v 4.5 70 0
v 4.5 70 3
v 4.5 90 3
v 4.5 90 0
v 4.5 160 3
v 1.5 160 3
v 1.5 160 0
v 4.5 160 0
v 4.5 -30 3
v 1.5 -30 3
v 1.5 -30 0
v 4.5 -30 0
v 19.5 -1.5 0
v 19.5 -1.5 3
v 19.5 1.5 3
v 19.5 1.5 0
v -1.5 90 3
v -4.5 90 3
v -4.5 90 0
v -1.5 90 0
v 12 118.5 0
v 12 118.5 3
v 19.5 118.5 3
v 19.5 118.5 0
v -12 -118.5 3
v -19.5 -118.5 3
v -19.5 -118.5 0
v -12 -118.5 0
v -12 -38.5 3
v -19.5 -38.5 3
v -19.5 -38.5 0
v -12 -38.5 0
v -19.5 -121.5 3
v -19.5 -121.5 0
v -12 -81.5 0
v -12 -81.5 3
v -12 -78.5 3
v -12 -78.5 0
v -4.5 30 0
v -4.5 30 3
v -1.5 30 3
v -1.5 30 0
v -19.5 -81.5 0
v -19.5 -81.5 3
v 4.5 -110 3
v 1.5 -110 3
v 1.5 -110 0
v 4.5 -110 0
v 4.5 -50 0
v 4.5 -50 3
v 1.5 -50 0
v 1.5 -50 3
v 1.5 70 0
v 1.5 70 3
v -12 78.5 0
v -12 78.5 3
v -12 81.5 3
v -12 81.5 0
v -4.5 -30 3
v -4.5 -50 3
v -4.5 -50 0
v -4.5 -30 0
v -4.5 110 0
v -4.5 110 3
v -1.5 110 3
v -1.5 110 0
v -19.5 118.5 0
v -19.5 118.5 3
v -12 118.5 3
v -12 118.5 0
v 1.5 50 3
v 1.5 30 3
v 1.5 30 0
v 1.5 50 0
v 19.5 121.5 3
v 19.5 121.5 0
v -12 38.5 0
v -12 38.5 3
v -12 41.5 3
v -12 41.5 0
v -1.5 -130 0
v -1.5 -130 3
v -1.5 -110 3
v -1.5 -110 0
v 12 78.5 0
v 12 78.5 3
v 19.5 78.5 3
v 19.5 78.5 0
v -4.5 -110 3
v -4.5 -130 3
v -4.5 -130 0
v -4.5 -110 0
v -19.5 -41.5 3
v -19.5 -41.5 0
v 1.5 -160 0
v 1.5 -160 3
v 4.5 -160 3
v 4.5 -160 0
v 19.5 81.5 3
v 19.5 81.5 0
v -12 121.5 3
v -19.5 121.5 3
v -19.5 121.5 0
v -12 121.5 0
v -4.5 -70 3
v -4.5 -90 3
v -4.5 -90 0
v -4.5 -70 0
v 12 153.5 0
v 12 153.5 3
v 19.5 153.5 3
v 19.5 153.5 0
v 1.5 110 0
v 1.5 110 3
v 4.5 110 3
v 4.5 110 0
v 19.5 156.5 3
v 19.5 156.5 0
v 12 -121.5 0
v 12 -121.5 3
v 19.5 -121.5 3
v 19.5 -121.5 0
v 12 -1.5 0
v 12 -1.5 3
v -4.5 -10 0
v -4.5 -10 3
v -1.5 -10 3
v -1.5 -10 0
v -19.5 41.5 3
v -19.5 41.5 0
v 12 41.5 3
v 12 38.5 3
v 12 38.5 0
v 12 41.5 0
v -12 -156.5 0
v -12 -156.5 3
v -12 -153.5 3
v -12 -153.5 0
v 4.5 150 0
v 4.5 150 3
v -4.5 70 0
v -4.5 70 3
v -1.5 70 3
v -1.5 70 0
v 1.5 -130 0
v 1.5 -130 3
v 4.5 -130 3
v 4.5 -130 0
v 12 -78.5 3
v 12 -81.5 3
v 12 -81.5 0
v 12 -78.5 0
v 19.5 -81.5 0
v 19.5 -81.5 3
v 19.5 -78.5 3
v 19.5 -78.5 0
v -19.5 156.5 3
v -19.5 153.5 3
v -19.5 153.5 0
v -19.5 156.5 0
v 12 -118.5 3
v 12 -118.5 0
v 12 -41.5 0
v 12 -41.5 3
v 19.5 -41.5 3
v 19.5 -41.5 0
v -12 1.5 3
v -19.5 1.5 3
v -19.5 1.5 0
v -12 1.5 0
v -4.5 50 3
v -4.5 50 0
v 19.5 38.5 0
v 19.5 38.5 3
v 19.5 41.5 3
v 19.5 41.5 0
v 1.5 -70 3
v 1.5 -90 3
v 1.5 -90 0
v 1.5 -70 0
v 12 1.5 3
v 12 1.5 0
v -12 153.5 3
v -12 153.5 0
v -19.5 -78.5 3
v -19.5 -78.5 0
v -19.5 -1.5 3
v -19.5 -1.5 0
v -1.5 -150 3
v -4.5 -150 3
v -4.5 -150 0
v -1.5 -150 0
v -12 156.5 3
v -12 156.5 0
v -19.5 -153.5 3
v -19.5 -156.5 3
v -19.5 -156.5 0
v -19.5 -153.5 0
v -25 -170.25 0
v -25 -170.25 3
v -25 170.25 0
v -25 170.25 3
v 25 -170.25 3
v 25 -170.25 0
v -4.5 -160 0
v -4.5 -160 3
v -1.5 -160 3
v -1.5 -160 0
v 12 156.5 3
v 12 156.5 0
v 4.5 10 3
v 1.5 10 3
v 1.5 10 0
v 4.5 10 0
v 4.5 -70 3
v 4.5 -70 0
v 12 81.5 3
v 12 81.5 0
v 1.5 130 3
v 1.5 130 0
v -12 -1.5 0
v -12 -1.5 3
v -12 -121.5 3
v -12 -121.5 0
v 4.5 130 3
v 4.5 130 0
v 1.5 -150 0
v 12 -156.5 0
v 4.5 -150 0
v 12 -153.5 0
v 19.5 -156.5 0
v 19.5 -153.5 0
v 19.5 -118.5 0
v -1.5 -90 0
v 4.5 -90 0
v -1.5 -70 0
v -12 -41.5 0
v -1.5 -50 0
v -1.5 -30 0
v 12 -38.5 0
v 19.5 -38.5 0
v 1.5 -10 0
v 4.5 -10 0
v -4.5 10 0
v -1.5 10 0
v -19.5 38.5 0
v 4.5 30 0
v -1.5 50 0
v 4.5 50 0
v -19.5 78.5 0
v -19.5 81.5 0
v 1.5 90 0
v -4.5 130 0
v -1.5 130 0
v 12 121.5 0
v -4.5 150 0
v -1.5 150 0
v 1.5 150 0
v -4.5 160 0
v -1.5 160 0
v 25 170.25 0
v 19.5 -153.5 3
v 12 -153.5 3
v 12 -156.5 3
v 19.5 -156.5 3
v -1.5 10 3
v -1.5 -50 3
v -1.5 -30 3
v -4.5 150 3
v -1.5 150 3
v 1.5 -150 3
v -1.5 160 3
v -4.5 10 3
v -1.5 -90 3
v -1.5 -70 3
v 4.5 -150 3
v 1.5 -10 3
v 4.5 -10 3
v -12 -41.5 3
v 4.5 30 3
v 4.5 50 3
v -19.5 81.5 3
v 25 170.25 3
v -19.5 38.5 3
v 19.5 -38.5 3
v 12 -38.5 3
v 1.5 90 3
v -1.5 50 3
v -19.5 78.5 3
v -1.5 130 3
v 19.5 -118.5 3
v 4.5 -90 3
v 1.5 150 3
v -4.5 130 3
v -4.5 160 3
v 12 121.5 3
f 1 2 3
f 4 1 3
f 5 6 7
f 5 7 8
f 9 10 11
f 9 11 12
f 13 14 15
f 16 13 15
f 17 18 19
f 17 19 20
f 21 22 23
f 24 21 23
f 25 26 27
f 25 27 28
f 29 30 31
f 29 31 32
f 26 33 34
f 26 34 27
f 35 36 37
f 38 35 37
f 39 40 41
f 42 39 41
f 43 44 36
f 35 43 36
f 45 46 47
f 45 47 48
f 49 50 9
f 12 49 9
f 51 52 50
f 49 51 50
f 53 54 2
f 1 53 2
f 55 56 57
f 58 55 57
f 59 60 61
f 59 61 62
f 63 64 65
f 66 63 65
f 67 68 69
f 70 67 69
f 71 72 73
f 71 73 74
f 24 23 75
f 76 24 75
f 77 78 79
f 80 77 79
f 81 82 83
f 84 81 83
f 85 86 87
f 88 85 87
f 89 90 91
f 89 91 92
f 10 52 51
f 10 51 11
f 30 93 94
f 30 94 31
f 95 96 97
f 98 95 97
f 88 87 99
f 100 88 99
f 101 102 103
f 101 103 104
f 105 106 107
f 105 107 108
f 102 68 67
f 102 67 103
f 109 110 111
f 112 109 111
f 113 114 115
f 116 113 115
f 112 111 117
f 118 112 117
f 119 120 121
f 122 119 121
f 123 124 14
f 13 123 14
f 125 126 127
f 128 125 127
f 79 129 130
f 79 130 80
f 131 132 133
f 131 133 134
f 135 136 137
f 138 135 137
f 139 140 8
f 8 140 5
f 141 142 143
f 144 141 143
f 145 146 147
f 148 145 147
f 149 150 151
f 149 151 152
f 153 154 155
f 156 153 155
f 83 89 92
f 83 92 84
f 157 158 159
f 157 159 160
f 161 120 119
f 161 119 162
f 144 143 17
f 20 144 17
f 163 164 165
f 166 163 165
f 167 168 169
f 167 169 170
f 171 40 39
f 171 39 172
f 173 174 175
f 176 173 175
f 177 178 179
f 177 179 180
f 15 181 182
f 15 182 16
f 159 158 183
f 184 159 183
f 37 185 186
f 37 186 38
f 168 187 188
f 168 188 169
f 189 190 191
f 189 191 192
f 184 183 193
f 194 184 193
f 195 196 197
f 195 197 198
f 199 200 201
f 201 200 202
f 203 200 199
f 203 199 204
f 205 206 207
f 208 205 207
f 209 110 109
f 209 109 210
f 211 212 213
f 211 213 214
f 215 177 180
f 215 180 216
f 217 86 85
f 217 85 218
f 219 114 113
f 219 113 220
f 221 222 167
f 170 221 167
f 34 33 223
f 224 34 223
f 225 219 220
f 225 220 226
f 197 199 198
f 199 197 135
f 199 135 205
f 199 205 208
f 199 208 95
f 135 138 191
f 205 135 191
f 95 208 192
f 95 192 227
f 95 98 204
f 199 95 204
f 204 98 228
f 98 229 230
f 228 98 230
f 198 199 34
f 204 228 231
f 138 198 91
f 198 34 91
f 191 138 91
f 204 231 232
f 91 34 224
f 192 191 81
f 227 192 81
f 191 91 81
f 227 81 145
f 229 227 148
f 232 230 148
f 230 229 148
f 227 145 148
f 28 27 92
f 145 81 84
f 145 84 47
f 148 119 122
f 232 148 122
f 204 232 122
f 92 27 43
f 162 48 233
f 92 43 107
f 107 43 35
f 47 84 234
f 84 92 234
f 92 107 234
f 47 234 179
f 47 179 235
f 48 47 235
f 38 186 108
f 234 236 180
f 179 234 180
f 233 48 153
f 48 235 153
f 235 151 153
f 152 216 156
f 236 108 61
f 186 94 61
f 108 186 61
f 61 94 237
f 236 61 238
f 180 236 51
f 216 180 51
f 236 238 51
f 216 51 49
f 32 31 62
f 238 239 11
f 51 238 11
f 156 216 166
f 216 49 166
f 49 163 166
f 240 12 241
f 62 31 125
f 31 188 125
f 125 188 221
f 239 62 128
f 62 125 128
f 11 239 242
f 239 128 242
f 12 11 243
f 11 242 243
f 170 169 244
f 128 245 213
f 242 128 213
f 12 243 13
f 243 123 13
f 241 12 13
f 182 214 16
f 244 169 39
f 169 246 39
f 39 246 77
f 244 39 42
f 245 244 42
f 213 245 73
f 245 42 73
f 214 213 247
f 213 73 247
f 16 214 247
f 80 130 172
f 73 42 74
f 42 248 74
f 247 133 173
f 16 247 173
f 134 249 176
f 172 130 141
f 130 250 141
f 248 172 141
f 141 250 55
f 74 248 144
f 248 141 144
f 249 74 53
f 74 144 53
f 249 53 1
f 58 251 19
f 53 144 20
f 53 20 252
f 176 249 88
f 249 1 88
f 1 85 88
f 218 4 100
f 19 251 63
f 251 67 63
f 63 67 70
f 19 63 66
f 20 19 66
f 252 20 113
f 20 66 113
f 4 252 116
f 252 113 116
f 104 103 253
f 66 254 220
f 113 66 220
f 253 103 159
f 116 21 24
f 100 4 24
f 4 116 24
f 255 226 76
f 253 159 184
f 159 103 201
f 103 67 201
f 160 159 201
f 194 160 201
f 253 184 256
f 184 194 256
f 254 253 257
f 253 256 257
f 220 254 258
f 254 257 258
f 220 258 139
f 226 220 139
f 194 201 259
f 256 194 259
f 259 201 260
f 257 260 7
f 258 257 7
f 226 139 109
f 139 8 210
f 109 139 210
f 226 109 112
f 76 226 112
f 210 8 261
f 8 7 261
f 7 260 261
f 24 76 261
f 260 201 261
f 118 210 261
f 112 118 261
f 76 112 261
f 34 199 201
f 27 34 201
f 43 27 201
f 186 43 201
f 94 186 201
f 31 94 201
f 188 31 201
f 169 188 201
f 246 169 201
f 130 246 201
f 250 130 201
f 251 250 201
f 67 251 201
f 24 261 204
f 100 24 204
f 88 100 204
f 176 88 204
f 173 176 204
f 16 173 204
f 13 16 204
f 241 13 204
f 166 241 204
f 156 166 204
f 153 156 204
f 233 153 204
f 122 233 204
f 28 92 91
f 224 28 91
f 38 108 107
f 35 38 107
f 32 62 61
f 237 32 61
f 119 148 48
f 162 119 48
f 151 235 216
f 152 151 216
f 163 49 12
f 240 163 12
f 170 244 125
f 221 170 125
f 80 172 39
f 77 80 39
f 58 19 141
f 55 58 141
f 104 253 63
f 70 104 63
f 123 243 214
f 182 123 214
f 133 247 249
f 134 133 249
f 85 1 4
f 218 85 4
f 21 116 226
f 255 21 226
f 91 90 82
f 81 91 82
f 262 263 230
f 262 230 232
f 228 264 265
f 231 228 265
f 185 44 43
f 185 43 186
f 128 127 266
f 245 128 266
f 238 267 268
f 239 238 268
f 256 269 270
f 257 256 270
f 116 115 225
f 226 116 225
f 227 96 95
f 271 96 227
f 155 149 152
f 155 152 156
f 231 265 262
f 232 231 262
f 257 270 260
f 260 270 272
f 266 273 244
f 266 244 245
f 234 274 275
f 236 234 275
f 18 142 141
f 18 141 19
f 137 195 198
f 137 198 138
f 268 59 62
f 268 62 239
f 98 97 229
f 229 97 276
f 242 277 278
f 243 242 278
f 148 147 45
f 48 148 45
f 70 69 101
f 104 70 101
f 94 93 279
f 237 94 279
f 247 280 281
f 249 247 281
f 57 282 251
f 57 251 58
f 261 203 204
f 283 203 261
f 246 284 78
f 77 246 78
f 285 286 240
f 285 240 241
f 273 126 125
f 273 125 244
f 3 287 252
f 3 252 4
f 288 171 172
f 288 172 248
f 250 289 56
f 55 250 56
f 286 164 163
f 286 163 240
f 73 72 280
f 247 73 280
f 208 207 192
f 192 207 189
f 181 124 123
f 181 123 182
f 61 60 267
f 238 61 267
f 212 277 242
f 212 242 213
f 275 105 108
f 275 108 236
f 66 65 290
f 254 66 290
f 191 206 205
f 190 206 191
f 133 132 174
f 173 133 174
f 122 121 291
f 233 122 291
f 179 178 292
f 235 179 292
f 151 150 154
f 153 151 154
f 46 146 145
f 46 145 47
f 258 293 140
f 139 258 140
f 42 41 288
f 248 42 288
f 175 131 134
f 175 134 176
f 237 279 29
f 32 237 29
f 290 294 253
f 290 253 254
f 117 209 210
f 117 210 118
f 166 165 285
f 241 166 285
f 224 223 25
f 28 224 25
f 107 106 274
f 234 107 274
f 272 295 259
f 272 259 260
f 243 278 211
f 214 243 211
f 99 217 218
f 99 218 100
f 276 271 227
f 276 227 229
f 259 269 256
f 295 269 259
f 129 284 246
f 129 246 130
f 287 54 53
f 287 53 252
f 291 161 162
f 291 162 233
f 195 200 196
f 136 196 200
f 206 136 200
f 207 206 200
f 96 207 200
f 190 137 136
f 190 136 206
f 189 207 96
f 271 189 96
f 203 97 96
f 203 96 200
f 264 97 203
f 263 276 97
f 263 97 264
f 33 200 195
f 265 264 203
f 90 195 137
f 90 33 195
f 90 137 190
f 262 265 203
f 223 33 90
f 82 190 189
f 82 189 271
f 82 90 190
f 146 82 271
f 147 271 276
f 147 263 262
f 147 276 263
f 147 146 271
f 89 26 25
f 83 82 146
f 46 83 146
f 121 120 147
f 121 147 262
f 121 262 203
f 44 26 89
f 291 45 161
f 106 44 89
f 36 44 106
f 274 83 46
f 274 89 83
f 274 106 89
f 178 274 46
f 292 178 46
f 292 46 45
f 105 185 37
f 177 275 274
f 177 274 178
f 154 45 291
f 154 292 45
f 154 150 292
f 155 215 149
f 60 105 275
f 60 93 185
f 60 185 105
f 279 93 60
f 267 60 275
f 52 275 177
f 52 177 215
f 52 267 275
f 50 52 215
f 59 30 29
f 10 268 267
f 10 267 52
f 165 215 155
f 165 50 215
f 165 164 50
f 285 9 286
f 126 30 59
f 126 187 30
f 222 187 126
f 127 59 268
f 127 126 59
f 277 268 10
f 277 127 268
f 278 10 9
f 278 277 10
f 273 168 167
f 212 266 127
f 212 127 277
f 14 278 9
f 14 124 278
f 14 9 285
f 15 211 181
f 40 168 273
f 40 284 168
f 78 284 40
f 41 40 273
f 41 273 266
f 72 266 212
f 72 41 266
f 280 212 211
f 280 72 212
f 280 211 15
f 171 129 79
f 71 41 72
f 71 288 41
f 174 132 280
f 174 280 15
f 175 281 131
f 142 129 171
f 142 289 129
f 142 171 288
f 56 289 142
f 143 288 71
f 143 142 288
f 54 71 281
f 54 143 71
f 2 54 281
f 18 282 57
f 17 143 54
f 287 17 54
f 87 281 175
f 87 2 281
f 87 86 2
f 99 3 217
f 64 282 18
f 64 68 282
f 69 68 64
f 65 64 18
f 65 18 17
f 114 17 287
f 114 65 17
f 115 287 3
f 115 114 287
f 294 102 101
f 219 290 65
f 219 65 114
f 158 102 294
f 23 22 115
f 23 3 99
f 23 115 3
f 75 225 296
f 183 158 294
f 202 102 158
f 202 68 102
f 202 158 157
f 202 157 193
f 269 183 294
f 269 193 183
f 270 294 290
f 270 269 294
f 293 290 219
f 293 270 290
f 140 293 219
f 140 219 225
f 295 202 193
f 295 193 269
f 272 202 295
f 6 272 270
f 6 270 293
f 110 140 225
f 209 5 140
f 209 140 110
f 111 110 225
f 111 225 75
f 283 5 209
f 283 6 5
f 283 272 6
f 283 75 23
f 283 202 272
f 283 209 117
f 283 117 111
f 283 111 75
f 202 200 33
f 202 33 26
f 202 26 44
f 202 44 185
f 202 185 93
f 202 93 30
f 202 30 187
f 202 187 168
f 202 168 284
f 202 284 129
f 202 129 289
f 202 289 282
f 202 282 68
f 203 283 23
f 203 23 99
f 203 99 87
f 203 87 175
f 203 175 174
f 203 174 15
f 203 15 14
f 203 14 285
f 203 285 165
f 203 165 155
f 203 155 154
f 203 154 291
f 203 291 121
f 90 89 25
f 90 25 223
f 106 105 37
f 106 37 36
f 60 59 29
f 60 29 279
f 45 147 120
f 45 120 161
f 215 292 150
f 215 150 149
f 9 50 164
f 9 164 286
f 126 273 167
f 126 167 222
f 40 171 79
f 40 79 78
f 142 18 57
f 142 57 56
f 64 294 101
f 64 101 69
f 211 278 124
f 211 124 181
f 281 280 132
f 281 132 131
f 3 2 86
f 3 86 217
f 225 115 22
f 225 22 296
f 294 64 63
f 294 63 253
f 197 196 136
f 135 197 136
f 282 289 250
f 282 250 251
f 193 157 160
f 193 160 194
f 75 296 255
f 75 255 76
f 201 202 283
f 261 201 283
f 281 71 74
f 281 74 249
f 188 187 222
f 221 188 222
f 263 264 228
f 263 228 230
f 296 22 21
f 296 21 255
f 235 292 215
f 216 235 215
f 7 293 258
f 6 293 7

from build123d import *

# Parameters (mm, degrees)
F0_W      = 50
F0_H      = 280
F1_DEPTH  = 3
F2_W      = 3
F2_H      = 20
F3_DEPTH  = 25
F4_W      = 7.5
F4_H      = 3
F5_DEPTH  = 25
F6_W      = 50
F6_H      = 30.25
F7_DEPTH  = 3
F8_W      = 3
F8_H      = 10
F9_DEPTH  = 25
F10_W     = 7.5
F10_H     = 3
F11_DEPTH = 25


with BuildPart() as f1:
    # F0 (on Top) → F1 (new body)
    with BuildSketch(Plane.XY):
        Rectangle(F0_W, F0_H)
    extrude(amount=F1_DEPTH)

    # F2 (on face) → F3 (cut)
    with BuildSketch(Plane.XY.offset(3)):
        with Locations((3, 120)):
            Rectangle(F2_W, F2_H)
        with Locations((3, 80)):
            Rectangle(F2_W, F2_H)
        with Locations((3, 40)):
            Rectangle(F2_W, F2_H)
        with Locations((3, 0)):
            Rectangle(F2_W, F2_H)
        with Locations((3, -40)):
            Rectangle(F2_W, F2_H)
        with Locations((3, -80)):
            Rectangle(F2_W, F2_H)
        with Locations((3, -120)):
            Rectangle(F2_W, F2_H)
        with Locations((-3, 120)):
            Rectangle(F2_W, F2_H)
        with Locations((-3, 80)):
            Rectangle(F2_W, F2_H)
        with Locations((-3, 40)):
            Rectangle(F2_W, F2_H)
        with Locations((-3, 0)):
            Rectangle(F2_W, F2_H)
        with Locations((-3, -40)):
            Rectangle(F2_W, F2_H)
        with Locations((-3, -80)):
            Rectangle(F2_W, F2_H)
        with Locations((-3, -120)):
            Rectangle(F2_W, F2_H)
    extrude(amount=-F3_DEPTH, mode=Mode.SUBTRACT)

    # F4 (on face) → F5 (cut)
    with BuildSketch(Plane.XY.offset(3)):
        with Locations((15.75, 120)):
            Rectangle(F4_W, F4_H)
        with Locations((15.75, 80)):
            Rectangle(F4_W, F4_H)
        with Locations((15.75, 40)):
            Rectangle(F4_W, F4_H)
        with Locations((15.75, 0)):
            Rectangle(F4_W, F4_H)
        with Locations((15.75, -40)):
            Rectangle(F4_W, F4_H)
        with Locations((15.75, -80)):
            Rectangle(F4_W, F4_H)
        with Locations((15.75, -120)):
            Rectangle(F4_W, F4_H)
        with Locations((-15.75, 120)):
            Rectangle(F4_W, F4_H)
        with Locations((-15.75, -80)):
            Rectangle(F4_W, F4_H)
        with Locations((-15.75, 40)):
            Rectangle(F4_W, F4_H)
        with Locations((-15.75, 80)):
            Rectangle(F4_W, F4_H)
        with Locations((-15.75, -40)):
            Rectangle(F4_W, F4_H)
        with Locations((-15.75, -120)):
            Rectangle(F4_W, F4_H)
        with Locations((-15.75, 0)):
            Rectangle(F4_W, F4_H)
    extrude(amount=-F5_DEPTH, mode=Mode.SUBTRACT)

    # F6 (on face) → F7 (join)
    with BuildSketch(Plane.XY.offset(3)):
        with Locations((0, 155.125)):
            Rectangle(F6_W, F6_H)
        with Locations((0, -155.125)):
            Rectangle(F6_W, F6_H)
    extrude(amount=-F7_DEPTH)

    # F8 (on face) → F9 (cut)
    with BuildSketch(Plane.XY.offset(3)):
        with Locations((-3, 155)):
            Rectangle(F8_W, F8_H)
        with Locations((3, 155)):
            Rectangle(F8_W, F8_H)
        with Locations((3, -155)):
            Rectangle(F8_W, F8_H)
        with Locations((-3, -155)):
            Rectangle(F8_W, F8_H)
    extrude(amount=-F9_DEPTH, mode=Mode.SUBTRACT)

    # F10 (on face) → F11 (cut)
    with BuildSketch(Plane.XY.offset(3)):
        with Locations((-15.75, -155)):
            Rectangle(F10_W, F10_H)
        with Locations((15.75, -155)):
            Rectangle(F10_W, F10_H)
        with Locations((-15.75, 155)):
            Rectangle(F10_W, F10_H)
        with Locations((15.75, 155)):
            Rectangle(F10_W, F10_H)
    extrude(amount=-F11_DEPTH, mode=Mode.SUBTRACT)


solid = f1.part
